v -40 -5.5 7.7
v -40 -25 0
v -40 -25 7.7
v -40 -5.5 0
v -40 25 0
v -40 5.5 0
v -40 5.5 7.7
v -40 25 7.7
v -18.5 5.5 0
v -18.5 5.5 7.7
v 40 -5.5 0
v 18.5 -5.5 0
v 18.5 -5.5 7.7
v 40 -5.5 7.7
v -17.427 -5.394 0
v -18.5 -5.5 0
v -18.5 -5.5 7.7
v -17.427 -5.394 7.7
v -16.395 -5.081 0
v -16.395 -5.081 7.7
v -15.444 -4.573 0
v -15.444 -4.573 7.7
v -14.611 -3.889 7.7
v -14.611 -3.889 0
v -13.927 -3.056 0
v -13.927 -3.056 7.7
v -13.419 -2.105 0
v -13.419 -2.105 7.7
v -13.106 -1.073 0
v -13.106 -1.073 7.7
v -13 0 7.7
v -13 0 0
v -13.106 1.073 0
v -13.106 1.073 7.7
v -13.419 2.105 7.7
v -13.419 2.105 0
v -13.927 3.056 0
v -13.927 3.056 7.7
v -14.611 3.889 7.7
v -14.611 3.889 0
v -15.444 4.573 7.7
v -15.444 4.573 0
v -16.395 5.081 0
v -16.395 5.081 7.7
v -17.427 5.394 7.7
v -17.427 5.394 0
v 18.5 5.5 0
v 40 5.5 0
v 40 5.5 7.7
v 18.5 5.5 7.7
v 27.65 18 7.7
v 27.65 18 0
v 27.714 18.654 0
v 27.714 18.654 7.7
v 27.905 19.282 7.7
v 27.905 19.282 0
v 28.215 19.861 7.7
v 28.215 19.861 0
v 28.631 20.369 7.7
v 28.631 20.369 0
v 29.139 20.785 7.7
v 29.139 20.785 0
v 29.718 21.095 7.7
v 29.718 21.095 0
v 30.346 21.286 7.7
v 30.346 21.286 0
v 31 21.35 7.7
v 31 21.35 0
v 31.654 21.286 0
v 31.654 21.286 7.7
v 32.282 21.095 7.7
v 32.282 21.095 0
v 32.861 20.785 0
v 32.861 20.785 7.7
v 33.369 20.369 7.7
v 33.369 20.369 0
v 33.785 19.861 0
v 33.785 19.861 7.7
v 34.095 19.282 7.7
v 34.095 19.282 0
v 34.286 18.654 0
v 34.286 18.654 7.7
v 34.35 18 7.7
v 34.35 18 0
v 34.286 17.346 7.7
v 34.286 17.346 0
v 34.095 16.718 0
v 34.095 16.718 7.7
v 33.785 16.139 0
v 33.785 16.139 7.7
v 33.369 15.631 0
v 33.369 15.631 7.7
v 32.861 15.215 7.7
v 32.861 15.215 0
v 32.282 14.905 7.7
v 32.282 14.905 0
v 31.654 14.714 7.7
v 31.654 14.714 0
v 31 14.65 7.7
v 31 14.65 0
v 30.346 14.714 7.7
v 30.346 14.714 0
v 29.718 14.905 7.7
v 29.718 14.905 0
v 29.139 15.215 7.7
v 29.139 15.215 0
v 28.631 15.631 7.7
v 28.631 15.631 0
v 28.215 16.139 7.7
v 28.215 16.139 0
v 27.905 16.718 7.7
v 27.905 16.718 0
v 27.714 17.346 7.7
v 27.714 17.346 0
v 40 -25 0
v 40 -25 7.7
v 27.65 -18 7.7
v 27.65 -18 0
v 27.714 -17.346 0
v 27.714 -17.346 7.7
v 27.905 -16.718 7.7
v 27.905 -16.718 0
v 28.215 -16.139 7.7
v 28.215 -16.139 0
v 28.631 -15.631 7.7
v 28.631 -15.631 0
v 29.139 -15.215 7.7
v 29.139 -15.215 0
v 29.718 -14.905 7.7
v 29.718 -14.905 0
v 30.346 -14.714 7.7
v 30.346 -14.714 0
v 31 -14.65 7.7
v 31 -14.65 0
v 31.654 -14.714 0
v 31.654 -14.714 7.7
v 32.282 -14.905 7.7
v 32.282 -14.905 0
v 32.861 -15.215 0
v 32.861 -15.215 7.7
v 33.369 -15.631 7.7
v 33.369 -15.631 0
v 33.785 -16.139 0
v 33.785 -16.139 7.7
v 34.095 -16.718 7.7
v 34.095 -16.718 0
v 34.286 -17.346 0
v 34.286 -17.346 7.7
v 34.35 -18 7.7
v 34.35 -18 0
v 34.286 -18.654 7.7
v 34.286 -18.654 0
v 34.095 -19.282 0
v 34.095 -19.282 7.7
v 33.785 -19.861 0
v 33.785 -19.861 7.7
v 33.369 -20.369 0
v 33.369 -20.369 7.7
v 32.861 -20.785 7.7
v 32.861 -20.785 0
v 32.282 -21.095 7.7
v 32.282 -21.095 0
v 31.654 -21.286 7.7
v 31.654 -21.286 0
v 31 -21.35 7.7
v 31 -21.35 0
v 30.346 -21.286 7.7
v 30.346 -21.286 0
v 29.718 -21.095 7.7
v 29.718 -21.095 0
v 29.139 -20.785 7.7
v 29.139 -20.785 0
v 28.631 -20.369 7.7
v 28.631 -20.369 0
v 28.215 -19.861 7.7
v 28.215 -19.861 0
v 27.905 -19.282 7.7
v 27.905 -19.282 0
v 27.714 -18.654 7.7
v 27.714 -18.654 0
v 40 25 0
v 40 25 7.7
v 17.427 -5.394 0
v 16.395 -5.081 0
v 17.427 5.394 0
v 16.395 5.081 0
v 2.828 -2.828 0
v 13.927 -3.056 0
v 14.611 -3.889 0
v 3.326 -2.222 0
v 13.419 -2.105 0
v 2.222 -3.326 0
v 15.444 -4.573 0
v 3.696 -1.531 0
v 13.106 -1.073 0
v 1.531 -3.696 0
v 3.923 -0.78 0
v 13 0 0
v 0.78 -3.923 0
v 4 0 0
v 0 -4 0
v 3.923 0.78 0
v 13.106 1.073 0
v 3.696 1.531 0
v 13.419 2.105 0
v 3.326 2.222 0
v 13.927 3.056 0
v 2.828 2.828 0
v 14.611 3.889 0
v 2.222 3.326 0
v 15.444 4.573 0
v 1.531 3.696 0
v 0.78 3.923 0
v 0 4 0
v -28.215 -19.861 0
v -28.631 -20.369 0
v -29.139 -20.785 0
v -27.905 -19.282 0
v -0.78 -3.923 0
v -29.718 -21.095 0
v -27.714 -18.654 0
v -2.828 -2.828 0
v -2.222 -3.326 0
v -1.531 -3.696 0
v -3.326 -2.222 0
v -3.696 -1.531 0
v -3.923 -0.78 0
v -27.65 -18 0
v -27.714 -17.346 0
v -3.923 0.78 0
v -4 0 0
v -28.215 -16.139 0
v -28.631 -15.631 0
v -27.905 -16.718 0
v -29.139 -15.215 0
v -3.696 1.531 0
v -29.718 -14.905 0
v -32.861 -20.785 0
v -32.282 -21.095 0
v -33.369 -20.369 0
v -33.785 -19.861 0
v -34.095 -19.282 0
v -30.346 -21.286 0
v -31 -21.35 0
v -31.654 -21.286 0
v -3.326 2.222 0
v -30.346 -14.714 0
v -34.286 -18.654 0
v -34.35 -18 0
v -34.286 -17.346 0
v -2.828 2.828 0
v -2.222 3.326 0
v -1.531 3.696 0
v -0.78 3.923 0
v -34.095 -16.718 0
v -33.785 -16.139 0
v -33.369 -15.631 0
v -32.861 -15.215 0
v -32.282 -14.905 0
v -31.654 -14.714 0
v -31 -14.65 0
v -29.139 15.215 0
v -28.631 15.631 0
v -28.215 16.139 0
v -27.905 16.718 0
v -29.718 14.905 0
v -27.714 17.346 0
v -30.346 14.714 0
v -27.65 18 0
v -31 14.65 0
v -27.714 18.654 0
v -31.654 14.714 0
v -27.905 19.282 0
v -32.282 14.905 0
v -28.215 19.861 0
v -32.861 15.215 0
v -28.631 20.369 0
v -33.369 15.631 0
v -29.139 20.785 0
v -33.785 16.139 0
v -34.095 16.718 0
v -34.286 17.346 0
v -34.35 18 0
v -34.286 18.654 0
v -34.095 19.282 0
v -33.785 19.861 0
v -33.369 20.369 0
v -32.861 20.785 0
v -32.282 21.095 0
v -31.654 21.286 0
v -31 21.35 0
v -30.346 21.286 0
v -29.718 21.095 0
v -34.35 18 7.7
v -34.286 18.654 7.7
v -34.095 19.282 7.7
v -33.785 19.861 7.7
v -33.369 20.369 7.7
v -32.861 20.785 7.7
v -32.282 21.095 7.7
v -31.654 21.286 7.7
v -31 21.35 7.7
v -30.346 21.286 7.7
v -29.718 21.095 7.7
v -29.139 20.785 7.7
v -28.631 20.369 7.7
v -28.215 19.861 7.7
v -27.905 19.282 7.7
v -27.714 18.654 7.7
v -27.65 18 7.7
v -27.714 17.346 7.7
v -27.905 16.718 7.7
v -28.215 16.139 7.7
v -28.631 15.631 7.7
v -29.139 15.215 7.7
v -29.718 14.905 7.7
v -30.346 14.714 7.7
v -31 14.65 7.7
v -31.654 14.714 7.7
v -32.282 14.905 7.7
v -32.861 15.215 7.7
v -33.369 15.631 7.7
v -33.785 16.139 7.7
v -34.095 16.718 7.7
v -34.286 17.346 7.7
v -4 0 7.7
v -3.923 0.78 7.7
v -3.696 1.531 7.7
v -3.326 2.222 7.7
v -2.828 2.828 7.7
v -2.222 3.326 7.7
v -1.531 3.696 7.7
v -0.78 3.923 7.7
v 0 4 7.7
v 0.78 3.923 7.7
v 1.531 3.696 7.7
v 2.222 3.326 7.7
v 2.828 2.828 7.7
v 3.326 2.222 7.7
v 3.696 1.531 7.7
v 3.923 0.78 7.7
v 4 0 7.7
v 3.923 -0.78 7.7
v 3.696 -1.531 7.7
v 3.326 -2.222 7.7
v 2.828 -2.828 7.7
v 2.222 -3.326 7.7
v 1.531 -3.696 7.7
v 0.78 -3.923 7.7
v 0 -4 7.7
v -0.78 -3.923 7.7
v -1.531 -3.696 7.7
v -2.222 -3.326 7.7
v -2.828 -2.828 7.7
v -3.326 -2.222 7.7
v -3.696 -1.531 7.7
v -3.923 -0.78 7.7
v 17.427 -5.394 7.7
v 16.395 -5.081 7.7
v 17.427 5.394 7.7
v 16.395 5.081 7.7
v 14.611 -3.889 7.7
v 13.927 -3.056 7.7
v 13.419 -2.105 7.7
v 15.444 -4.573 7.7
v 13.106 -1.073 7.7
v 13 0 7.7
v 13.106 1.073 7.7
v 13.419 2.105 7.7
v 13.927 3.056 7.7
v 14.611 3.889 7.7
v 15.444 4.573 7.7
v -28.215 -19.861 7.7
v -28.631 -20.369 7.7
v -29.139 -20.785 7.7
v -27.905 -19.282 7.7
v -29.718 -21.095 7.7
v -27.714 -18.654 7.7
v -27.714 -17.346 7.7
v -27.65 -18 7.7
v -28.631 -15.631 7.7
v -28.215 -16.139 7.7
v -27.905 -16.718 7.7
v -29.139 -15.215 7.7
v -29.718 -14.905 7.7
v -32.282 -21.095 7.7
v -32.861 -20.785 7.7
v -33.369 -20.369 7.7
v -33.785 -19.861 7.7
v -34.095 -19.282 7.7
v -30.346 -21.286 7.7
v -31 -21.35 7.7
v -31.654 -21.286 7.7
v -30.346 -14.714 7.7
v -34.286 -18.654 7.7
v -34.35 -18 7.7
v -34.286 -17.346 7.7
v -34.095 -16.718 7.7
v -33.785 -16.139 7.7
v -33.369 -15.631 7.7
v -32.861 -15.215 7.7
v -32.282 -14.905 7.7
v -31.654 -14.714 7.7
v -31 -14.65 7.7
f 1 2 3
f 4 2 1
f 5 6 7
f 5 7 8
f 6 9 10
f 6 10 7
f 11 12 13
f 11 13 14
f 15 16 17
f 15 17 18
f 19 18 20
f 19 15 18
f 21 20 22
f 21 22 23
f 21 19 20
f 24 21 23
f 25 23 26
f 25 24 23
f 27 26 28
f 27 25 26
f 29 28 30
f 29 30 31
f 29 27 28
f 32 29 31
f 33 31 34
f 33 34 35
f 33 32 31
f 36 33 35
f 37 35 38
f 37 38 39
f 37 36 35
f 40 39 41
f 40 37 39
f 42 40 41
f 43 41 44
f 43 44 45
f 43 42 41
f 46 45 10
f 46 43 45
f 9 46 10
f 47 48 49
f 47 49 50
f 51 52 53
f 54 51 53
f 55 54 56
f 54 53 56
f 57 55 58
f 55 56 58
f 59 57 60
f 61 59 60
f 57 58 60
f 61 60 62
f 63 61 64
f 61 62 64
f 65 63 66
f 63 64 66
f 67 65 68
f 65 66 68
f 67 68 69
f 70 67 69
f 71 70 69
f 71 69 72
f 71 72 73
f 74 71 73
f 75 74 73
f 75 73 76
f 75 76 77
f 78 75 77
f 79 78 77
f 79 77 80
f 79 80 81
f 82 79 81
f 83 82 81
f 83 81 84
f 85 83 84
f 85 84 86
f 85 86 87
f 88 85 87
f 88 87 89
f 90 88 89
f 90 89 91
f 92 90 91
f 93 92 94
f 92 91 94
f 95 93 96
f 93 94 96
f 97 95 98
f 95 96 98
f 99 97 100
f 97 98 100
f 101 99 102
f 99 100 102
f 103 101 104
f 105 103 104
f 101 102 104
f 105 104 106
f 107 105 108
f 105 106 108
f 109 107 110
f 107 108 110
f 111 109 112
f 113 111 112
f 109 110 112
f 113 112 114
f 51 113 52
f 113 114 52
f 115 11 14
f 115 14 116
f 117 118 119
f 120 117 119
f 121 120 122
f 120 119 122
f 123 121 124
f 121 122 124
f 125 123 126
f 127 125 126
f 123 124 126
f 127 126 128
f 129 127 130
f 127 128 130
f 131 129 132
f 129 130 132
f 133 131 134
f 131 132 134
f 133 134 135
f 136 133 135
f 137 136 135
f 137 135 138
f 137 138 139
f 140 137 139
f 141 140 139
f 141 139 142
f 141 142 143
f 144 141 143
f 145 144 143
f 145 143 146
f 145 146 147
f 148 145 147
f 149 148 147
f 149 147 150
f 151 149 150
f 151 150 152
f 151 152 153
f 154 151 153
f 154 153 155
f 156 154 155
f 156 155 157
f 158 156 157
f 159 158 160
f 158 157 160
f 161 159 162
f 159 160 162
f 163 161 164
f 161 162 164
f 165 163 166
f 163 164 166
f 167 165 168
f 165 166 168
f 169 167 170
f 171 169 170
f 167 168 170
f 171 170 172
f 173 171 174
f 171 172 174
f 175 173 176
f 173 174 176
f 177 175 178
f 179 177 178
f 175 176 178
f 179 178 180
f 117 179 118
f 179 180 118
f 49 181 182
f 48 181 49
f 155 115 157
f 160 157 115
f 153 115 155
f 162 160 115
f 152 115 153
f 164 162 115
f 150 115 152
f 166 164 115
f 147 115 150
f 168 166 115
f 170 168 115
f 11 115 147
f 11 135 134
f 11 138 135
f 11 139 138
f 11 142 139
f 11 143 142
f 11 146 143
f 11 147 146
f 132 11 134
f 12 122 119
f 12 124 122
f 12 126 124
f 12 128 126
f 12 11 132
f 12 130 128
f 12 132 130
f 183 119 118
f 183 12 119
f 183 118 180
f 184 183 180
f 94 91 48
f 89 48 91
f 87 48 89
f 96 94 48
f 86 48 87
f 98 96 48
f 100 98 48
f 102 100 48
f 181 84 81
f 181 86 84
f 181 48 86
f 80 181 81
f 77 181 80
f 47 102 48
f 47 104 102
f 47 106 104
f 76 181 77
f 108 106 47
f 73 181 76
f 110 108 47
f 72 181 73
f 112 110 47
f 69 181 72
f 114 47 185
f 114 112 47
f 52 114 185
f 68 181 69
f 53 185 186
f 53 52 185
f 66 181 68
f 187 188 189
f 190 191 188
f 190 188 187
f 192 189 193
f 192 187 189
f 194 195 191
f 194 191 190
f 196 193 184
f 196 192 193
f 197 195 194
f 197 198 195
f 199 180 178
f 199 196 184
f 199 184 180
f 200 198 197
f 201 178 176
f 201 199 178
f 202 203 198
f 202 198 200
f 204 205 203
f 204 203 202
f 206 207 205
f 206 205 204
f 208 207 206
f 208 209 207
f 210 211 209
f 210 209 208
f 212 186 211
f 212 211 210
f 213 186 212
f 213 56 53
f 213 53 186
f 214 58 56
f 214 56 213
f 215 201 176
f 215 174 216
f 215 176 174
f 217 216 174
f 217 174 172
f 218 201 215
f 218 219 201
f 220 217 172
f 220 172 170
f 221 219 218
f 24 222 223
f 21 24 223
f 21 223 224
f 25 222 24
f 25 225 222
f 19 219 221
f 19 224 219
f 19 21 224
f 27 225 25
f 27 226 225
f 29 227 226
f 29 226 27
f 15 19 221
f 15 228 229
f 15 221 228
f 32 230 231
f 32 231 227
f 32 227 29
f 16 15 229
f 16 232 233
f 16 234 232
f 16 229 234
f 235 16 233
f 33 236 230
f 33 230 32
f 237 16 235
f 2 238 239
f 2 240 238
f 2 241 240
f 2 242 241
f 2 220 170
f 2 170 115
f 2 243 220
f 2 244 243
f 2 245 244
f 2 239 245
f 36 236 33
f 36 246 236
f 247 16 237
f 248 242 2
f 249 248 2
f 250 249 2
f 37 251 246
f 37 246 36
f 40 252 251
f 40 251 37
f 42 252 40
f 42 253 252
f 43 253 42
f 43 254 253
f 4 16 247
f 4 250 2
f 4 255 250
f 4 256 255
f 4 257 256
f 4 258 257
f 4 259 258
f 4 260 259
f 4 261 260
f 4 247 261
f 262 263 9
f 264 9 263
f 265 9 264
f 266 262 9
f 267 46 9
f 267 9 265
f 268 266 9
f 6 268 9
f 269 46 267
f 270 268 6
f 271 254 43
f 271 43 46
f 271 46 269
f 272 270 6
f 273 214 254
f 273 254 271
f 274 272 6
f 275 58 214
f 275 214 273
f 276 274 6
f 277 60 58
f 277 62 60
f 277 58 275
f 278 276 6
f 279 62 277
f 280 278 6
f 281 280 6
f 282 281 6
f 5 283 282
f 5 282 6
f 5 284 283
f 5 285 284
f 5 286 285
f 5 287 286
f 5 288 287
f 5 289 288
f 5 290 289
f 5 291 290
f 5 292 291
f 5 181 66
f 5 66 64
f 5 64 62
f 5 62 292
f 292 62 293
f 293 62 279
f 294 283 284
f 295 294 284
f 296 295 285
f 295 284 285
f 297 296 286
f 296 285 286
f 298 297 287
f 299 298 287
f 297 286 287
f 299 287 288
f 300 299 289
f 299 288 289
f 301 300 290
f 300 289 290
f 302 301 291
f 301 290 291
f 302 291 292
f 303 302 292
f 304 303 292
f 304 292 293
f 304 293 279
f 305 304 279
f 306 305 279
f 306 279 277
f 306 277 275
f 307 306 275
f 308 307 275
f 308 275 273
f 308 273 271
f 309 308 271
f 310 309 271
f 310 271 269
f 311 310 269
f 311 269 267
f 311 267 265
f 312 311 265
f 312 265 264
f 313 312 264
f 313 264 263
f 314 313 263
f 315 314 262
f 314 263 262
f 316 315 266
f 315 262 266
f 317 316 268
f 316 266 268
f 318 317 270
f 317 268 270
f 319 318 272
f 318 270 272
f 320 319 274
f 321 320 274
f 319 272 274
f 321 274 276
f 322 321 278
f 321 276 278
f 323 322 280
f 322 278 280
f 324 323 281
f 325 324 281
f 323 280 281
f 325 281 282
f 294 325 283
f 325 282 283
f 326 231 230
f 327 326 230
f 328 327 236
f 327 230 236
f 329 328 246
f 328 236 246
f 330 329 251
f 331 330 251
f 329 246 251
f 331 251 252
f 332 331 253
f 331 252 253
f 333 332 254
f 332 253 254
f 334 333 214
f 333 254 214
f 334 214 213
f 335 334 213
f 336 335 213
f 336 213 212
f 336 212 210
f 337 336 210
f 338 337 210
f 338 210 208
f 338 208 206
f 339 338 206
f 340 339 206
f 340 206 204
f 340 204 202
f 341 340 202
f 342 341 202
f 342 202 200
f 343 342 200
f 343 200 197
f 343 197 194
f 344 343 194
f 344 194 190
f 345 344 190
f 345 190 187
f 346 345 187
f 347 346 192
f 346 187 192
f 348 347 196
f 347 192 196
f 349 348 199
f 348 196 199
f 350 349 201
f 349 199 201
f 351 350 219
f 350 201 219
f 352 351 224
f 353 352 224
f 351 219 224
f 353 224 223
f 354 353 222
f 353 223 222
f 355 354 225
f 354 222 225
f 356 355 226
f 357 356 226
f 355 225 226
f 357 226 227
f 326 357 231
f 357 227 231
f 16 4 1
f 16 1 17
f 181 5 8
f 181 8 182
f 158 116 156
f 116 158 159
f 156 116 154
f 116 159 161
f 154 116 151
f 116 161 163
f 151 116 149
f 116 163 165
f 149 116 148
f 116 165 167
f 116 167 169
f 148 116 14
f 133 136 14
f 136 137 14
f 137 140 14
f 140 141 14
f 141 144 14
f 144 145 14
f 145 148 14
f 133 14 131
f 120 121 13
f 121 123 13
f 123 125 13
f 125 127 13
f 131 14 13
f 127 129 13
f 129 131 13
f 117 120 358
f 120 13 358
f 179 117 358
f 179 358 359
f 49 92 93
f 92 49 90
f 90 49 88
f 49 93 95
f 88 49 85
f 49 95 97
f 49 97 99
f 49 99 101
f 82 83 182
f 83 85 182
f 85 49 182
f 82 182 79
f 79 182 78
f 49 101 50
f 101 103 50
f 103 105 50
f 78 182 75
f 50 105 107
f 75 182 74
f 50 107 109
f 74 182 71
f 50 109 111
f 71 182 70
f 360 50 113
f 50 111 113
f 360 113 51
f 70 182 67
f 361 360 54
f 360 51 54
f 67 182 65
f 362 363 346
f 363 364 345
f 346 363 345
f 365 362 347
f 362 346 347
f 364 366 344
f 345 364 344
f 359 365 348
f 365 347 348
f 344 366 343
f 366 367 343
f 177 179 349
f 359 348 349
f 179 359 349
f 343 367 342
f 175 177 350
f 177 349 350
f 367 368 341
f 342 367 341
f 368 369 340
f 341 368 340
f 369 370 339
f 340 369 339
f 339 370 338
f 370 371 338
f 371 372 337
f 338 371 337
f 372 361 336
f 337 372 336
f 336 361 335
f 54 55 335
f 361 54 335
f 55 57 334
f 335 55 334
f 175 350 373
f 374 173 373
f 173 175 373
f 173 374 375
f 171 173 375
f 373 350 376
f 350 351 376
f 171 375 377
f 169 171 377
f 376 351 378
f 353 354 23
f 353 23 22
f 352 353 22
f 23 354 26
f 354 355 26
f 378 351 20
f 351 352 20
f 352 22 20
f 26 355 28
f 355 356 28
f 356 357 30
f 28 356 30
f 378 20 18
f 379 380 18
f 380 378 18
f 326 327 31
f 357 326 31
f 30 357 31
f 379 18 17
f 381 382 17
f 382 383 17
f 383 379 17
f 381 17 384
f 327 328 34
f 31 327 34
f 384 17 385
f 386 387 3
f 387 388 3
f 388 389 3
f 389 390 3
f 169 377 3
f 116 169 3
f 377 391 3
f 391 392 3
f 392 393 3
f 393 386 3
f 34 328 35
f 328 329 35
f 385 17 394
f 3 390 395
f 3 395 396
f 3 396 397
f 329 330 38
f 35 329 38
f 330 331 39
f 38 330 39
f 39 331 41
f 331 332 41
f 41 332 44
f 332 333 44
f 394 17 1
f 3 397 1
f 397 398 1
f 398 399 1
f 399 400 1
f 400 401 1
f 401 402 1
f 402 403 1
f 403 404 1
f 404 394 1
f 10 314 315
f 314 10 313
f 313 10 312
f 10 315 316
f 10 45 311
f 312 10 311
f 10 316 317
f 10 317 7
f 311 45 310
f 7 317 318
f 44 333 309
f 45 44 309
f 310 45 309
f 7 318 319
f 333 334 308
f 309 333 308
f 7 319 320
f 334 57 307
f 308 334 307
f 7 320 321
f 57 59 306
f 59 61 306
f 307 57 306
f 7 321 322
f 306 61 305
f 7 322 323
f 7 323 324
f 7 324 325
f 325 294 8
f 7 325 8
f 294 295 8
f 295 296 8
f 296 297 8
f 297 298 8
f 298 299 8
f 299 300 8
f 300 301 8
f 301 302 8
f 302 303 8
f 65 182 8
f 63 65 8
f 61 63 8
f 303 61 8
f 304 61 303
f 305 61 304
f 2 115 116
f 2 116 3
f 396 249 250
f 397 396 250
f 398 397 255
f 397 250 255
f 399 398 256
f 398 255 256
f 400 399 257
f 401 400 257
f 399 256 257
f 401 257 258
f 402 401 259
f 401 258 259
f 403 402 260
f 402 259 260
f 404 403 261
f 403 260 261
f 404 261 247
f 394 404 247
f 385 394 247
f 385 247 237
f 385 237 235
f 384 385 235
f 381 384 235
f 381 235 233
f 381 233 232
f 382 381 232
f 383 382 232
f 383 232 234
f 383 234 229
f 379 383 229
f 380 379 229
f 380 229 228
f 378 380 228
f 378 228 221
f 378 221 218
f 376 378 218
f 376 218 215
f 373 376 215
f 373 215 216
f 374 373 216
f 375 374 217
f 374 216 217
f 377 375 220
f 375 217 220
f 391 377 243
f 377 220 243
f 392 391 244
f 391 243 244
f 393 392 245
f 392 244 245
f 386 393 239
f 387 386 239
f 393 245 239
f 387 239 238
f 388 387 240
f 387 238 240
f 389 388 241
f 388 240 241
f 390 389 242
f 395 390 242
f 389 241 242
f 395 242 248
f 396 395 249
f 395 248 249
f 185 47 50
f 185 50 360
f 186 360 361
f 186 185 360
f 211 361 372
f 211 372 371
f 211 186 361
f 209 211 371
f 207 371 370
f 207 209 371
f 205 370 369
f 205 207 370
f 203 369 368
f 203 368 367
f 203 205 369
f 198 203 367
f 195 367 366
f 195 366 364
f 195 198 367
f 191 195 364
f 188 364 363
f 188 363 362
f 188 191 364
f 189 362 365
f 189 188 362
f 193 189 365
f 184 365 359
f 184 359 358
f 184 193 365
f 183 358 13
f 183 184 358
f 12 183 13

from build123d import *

# Parameters (mm, degrees)
BOSS_EXTRUDE1_DEPTH        = 7.7
F_6_7_6_7_DIAMETER_HOLE1_D = 6.7
F_8_0_8_DIAMETER_HOLE1_D   = 8


with BuildPart() as part:
    # Sketch1 → Boss-Extrude1 (new body)
    with BuildSketch(Plane.XY):
        with BuildLine():
            Line((-40, 25), (40, 25))
            Line((40, 25), (40, 5.5))
            Line((40, 5.5), (18.5, 5.5))
            ThreePointArc((18.5, 5.5), (13, 0), (18.5, -5.5))
            Line((18.5, -5.5), (40, -5.5))
            Line((40, -5.5), (40, -25))
            Line((40, -25), (-40, -25))
            Line((-40, -25), (-40, -5.5))
            Line((-40, -5.5), (-18.5, -5.5))
            ThreePointArc((-18.5, -5.5), (-13, 0), (-18.5, 5.5))
            Line((-18.5, 5.5), (-40, 5.5))
            Line((-40, 5.5), (-40, 25))
        make_face()
    extrude(amount=BOSS_EXTRUDE1_DEPTH)

    # Ø6.7 (6.7) Diameter Hole1 (through all)
    with Locations(Plane.XY.offset(7.7)):
        with Locations((31, 18), (-31, 18), (-31, -18), (31, -18)):
            Hole(F_6_7_6_7_DIAMETER_HOLE1_D / 2)

    # Ø8.0 (8) Diameter Hole1 (through all)
    with Locations(Plane.XY.offset(7.7)):
        with Locations((0, 0)):
            Hole(F_8_0_8_DIAMETER_HOLE1_D / 2)


solid = part.part
